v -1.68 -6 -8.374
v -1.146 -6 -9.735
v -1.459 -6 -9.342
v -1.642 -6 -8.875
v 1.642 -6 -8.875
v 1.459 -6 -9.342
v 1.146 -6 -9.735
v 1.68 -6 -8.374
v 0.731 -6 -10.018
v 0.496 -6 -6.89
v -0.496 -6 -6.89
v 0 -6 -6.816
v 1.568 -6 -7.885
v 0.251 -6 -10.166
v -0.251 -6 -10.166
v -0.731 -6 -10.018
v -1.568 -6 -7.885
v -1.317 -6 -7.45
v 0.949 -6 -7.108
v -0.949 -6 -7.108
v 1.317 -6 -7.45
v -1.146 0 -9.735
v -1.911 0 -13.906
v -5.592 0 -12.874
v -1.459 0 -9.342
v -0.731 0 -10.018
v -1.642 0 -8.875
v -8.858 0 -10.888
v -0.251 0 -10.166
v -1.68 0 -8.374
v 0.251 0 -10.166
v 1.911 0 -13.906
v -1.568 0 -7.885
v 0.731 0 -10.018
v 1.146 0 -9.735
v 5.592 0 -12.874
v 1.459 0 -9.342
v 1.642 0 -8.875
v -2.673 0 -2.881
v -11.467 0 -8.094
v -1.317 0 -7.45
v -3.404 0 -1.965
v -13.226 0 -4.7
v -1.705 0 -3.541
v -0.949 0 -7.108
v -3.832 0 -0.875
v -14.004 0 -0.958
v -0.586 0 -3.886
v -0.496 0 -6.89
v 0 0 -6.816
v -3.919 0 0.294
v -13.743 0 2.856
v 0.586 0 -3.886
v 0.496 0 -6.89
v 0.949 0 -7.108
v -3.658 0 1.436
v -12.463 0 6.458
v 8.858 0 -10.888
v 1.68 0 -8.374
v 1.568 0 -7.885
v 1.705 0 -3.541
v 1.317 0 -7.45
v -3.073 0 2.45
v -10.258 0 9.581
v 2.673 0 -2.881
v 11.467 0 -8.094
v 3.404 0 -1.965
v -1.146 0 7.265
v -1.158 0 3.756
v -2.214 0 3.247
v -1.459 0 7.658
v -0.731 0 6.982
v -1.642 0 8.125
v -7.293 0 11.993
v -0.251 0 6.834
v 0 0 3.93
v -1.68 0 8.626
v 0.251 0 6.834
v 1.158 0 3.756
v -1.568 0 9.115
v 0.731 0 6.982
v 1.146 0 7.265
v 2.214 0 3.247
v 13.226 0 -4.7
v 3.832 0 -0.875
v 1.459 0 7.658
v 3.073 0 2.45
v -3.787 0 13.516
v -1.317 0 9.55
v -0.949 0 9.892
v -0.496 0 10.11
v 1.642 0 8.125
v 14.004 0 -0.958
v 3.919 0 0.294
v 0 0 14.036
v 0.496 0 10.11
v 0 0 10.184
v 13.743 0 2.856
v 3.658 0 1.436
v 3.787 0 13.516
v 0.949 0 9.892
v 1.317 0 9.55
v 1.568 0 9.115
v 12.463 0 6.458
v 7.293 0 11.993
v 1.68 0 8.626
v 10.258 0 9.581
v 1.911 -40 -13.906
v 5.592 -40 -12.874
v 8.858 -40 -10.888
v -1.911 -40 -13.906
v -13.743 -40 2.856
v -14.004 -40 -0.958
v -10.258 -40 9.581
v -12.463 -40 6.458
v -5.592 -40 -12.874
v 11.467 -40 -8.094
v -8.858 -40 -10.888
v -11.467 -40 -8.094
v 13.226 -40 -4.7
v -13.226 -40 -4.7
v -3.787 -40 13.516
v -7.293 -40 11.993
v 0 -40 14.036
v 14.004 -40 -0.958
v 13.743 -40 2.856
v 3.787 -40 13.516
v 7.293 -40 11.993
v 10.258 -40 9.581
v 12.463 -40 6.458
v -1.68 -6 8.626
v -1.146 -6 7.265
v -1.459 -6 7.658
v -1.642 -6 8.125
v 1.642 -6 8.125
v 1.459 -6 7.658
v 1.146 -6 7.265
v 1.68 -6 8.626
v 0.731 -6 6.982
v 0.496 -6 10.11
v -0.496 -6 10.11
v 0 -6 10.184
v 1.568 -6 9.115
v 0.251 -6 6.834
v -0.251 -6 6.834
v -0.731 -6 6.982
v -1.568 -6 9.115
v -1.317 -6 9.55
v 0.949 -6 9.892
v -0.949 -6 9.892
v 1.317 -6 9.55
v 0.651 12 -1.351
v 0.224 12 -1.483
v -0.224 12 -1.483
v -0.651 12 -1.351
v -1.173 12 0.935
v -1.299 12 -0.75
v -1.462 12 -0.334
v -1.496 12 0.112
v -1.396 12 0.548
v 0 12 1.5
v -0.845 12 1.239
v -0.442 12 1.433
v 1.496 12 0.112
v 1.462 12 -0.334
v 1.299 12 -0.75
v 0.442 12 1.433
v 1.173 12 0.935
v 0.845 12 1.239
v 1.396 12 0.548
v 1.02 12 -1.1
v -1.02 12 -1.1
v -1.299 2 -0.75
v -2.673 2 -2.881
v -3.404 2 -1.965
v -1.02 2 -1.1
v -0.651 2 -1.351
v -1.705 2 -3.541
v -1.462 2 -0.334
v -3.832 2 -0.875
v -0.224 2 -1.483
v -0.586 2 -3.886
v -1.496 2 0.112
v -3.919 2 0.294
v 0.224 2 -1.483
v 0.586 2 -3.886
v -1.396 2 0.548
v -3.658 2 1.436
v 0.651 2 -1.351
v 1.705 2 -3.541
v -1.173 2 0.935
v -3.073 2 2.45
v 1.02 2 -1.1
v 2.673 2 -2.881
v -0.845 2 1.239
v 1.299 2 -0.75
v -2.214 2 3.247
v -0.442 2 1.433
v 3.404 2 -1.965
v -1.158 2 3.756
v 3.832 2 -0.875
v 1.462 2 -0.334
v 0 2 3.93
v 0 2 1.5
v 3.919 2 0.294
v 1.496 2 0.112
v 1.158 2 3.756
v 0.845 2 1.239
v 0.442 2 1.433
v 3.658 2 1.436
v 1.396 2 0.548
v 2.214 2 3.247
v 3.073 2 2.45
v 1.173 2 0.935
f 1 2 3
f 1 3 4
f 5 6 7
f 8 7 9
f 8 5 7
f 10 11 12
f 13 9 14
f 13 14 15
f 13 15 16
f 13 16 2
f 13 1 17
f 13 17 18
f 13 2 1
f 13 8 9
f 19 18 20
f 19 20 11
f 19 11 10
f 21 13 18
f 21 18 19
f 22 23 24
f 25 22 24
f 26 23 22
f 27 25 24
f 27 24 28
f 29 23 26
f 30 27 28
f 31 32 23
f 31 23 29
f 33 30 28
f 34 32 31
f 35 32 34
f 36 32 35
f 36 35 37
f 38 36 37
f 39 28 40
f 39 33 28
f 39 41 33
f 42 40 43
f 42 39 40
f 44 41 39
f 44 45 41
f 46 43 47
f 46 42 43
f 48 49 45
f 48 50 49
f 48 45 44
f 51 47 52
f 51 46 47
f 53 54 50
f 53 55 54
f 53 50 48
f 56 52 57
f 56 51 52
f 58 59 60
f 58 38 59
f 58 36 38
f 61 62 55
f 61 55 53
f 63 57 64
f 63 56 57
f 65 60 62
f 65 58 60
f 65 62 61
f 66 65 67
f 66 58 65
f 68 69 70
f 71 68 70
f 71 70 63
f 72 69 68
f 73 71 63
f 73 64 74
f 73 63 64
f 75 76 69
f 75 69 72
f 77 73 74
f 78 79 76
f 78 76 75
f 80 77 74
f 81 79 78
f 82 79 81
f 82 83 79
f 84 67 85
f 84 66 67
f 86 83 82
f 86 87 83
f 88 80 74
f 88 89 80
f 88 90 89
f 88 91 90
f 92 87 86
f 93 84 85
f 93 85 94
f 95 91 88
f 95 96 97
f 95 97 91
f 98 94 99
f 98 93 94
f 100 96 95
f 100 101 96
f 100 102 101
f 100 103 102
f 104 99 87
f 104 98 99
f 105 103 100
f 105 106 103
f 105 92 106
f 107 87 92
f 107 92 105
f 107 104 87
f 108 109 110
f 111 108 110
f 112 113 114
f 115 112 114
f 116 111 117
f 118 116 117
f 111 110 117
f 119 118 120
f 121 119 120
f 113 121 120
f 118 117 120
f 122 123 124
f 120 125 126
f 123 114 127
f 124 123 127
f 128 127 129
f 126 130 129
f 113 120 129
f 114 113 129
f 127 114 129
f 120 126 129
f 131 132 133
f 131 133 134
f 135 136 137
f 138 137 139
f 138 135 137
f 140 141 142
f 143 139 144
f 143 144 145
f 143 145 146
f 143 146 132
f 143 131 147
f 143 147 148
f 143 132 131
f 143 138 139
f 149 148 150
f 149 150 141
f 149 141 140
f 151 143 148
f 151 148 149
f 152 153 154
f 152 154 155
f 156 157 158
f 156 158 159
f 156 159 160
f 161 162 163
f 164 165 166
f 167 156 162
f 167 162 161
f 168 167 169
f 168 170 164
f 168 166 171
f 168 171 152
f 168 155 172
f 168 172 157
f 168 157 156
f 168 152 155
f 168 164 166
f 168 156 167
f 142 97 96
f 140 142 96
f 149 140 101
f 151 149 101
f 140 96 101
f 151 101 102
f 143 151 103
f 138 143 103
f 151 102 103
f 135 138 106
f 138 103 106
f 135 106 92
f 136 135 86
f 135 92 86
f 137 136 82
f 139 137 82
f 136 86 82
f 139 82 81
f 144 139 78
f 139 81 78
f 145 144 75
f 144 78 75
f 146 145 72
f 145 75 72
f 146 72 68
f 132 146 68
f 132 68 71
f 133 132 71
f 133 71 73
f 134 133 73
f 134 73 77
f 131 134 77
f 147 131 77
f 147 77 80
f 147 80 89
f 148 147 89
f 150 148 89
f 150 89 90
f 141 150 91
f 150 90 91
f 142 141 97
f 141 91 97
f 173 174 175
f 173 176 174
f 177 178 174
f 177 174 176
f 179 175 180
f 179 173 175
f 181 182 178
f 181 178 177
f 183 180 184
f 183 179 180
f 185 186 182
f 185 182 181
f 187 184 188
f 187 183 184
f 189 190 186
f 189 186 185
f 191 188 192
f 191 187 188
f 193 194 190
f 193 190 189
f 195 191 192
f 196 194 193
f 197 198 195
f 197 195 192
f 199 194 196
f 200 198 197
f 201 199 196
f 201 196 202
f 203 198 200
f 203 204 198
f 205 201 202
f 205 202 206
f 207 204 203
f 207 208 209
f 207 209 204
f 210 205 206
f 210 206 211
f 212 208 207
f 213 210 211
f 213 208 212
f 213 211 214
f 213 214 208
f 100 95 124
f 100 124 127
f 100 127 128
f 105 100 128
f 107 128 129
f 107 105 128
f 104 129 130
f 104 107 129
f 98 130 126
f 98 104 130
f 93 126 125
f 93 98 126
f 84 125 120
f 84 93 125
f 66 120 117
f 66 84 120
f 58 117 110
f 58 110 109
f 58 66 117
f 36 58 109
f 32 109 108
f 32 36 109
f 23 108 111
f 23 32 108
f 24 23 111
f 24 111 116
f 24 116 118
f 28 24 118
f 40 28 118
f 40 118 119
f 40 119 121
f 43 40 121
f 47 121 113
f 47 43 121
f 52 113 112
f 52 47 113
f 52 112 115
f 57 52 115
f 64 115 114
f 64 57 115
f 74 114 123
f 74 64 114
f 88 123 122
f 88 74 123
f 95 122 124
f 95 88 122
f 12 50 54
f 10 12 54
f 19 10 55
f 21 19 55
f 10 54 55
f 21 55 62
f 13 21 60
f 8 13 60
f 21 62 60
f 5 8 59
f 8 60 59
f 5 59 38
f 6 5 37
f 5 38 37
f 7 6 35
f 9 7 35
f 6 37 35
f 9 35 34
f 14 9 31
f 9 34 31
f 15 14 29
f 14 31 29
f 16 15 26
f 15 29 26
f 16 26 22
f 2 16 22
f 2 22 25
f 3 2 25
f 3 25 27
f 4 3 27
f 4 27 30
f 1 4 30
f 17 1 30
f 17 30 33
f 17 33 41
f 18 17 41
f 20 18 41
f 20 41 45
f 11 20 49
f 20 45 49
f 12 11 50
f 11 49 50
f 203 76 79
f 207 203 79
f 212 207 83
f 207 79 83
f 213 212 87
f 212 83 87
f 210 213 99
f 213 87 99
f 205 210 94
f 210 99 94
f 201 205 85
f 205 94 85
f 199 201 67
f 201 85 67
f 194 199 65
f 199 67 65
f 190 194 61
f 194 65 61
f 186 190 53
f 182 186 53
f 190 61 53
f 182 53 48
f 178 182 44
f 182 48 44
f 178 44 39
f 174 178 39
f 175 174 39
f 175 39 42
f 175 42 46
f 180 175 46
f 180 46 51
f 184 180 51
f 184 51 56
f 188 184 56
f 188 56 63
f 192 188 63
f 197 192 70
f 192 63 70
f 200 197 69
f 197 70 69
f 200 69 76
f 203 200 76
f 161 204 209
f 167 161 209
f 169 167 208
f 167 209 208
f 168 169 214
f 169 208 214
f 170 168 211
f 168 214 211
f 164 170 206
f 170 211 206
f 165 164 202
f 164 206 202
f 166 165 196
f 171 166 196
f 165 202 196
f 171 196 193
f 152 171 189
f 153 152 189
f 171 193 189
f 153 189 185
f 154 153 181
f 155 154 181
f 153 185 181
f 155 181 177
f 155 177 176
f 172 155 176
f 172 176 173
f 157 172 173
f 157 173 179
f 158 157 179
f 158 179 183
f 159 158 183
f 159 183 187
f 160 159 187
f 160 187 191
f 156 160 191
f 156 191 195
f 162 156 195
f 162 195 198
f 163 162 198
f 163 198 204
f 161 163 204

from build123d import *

# Parameters (mm, degrees)
SKETCH_2_R          = 14.036295278
EXTRUDE_1_DEPTH     = 40
SKETCH_2_4_R        = 3.930162678
EXTRUDE_2_DEPTH     = 2
SKETCH_2_5_R        = 1.5
EXTRUDE_3_DEPTH     = 12
SKETCH_2_6_R        = 1.684355433
CUT_EXTRUDE_1_DEPTH = 6


with BuildPart() as part:
    # 草圖2 → 填料-伸長1 (new body)
    with BuildSketch(Plane(origin=(0, 0, 0), x_dir=(1, 0, 0), z_dir=(0, 1, 0))):
        Circle(SKETCH_2_R)
    extrude(amount=-EXTRUDE_1_DEPTH)

    # 草圖2<4> → 填料-伸長2 (add)
    with BuildSketch(Plane(origin=(0, 0, 0), x_dir=(1, 0, 0), z_dir=(0, 1, 0))):
        Circle(SKETCH_2_4_R)
    extrude(amount=EXTRUDE_2_DEPTH)

    # 草圖2<5> → 填料-伸長3 (add)
    with BuildSketch(Plane(origin=(0, 0, 0), x_dir=(1, 0, 0), z_dir=(0, 1, 0))):
        Circle(SKETCH_2_5_R)
    extrude(amount=EXTRUDE_3_DEPTH)

    # 草圖2<6> → 除料-伸長1 (cut)
    with BuildSketch(Plane(origin=(0, 0, 0), x_dir=(1, 0, 0), z_dir=(0, 1, 0))):
        with Locations((0, 8.5)):
            Circle(SKETCH_2_6_R)
        with Locations((0, -8.5)):
            Circle(SKETCH_2_6_R)
    extrude(amount=-CUT_EXTRUDE_1_DEPTH, mode=Mode.SUBTRACT)


solid = part.part
